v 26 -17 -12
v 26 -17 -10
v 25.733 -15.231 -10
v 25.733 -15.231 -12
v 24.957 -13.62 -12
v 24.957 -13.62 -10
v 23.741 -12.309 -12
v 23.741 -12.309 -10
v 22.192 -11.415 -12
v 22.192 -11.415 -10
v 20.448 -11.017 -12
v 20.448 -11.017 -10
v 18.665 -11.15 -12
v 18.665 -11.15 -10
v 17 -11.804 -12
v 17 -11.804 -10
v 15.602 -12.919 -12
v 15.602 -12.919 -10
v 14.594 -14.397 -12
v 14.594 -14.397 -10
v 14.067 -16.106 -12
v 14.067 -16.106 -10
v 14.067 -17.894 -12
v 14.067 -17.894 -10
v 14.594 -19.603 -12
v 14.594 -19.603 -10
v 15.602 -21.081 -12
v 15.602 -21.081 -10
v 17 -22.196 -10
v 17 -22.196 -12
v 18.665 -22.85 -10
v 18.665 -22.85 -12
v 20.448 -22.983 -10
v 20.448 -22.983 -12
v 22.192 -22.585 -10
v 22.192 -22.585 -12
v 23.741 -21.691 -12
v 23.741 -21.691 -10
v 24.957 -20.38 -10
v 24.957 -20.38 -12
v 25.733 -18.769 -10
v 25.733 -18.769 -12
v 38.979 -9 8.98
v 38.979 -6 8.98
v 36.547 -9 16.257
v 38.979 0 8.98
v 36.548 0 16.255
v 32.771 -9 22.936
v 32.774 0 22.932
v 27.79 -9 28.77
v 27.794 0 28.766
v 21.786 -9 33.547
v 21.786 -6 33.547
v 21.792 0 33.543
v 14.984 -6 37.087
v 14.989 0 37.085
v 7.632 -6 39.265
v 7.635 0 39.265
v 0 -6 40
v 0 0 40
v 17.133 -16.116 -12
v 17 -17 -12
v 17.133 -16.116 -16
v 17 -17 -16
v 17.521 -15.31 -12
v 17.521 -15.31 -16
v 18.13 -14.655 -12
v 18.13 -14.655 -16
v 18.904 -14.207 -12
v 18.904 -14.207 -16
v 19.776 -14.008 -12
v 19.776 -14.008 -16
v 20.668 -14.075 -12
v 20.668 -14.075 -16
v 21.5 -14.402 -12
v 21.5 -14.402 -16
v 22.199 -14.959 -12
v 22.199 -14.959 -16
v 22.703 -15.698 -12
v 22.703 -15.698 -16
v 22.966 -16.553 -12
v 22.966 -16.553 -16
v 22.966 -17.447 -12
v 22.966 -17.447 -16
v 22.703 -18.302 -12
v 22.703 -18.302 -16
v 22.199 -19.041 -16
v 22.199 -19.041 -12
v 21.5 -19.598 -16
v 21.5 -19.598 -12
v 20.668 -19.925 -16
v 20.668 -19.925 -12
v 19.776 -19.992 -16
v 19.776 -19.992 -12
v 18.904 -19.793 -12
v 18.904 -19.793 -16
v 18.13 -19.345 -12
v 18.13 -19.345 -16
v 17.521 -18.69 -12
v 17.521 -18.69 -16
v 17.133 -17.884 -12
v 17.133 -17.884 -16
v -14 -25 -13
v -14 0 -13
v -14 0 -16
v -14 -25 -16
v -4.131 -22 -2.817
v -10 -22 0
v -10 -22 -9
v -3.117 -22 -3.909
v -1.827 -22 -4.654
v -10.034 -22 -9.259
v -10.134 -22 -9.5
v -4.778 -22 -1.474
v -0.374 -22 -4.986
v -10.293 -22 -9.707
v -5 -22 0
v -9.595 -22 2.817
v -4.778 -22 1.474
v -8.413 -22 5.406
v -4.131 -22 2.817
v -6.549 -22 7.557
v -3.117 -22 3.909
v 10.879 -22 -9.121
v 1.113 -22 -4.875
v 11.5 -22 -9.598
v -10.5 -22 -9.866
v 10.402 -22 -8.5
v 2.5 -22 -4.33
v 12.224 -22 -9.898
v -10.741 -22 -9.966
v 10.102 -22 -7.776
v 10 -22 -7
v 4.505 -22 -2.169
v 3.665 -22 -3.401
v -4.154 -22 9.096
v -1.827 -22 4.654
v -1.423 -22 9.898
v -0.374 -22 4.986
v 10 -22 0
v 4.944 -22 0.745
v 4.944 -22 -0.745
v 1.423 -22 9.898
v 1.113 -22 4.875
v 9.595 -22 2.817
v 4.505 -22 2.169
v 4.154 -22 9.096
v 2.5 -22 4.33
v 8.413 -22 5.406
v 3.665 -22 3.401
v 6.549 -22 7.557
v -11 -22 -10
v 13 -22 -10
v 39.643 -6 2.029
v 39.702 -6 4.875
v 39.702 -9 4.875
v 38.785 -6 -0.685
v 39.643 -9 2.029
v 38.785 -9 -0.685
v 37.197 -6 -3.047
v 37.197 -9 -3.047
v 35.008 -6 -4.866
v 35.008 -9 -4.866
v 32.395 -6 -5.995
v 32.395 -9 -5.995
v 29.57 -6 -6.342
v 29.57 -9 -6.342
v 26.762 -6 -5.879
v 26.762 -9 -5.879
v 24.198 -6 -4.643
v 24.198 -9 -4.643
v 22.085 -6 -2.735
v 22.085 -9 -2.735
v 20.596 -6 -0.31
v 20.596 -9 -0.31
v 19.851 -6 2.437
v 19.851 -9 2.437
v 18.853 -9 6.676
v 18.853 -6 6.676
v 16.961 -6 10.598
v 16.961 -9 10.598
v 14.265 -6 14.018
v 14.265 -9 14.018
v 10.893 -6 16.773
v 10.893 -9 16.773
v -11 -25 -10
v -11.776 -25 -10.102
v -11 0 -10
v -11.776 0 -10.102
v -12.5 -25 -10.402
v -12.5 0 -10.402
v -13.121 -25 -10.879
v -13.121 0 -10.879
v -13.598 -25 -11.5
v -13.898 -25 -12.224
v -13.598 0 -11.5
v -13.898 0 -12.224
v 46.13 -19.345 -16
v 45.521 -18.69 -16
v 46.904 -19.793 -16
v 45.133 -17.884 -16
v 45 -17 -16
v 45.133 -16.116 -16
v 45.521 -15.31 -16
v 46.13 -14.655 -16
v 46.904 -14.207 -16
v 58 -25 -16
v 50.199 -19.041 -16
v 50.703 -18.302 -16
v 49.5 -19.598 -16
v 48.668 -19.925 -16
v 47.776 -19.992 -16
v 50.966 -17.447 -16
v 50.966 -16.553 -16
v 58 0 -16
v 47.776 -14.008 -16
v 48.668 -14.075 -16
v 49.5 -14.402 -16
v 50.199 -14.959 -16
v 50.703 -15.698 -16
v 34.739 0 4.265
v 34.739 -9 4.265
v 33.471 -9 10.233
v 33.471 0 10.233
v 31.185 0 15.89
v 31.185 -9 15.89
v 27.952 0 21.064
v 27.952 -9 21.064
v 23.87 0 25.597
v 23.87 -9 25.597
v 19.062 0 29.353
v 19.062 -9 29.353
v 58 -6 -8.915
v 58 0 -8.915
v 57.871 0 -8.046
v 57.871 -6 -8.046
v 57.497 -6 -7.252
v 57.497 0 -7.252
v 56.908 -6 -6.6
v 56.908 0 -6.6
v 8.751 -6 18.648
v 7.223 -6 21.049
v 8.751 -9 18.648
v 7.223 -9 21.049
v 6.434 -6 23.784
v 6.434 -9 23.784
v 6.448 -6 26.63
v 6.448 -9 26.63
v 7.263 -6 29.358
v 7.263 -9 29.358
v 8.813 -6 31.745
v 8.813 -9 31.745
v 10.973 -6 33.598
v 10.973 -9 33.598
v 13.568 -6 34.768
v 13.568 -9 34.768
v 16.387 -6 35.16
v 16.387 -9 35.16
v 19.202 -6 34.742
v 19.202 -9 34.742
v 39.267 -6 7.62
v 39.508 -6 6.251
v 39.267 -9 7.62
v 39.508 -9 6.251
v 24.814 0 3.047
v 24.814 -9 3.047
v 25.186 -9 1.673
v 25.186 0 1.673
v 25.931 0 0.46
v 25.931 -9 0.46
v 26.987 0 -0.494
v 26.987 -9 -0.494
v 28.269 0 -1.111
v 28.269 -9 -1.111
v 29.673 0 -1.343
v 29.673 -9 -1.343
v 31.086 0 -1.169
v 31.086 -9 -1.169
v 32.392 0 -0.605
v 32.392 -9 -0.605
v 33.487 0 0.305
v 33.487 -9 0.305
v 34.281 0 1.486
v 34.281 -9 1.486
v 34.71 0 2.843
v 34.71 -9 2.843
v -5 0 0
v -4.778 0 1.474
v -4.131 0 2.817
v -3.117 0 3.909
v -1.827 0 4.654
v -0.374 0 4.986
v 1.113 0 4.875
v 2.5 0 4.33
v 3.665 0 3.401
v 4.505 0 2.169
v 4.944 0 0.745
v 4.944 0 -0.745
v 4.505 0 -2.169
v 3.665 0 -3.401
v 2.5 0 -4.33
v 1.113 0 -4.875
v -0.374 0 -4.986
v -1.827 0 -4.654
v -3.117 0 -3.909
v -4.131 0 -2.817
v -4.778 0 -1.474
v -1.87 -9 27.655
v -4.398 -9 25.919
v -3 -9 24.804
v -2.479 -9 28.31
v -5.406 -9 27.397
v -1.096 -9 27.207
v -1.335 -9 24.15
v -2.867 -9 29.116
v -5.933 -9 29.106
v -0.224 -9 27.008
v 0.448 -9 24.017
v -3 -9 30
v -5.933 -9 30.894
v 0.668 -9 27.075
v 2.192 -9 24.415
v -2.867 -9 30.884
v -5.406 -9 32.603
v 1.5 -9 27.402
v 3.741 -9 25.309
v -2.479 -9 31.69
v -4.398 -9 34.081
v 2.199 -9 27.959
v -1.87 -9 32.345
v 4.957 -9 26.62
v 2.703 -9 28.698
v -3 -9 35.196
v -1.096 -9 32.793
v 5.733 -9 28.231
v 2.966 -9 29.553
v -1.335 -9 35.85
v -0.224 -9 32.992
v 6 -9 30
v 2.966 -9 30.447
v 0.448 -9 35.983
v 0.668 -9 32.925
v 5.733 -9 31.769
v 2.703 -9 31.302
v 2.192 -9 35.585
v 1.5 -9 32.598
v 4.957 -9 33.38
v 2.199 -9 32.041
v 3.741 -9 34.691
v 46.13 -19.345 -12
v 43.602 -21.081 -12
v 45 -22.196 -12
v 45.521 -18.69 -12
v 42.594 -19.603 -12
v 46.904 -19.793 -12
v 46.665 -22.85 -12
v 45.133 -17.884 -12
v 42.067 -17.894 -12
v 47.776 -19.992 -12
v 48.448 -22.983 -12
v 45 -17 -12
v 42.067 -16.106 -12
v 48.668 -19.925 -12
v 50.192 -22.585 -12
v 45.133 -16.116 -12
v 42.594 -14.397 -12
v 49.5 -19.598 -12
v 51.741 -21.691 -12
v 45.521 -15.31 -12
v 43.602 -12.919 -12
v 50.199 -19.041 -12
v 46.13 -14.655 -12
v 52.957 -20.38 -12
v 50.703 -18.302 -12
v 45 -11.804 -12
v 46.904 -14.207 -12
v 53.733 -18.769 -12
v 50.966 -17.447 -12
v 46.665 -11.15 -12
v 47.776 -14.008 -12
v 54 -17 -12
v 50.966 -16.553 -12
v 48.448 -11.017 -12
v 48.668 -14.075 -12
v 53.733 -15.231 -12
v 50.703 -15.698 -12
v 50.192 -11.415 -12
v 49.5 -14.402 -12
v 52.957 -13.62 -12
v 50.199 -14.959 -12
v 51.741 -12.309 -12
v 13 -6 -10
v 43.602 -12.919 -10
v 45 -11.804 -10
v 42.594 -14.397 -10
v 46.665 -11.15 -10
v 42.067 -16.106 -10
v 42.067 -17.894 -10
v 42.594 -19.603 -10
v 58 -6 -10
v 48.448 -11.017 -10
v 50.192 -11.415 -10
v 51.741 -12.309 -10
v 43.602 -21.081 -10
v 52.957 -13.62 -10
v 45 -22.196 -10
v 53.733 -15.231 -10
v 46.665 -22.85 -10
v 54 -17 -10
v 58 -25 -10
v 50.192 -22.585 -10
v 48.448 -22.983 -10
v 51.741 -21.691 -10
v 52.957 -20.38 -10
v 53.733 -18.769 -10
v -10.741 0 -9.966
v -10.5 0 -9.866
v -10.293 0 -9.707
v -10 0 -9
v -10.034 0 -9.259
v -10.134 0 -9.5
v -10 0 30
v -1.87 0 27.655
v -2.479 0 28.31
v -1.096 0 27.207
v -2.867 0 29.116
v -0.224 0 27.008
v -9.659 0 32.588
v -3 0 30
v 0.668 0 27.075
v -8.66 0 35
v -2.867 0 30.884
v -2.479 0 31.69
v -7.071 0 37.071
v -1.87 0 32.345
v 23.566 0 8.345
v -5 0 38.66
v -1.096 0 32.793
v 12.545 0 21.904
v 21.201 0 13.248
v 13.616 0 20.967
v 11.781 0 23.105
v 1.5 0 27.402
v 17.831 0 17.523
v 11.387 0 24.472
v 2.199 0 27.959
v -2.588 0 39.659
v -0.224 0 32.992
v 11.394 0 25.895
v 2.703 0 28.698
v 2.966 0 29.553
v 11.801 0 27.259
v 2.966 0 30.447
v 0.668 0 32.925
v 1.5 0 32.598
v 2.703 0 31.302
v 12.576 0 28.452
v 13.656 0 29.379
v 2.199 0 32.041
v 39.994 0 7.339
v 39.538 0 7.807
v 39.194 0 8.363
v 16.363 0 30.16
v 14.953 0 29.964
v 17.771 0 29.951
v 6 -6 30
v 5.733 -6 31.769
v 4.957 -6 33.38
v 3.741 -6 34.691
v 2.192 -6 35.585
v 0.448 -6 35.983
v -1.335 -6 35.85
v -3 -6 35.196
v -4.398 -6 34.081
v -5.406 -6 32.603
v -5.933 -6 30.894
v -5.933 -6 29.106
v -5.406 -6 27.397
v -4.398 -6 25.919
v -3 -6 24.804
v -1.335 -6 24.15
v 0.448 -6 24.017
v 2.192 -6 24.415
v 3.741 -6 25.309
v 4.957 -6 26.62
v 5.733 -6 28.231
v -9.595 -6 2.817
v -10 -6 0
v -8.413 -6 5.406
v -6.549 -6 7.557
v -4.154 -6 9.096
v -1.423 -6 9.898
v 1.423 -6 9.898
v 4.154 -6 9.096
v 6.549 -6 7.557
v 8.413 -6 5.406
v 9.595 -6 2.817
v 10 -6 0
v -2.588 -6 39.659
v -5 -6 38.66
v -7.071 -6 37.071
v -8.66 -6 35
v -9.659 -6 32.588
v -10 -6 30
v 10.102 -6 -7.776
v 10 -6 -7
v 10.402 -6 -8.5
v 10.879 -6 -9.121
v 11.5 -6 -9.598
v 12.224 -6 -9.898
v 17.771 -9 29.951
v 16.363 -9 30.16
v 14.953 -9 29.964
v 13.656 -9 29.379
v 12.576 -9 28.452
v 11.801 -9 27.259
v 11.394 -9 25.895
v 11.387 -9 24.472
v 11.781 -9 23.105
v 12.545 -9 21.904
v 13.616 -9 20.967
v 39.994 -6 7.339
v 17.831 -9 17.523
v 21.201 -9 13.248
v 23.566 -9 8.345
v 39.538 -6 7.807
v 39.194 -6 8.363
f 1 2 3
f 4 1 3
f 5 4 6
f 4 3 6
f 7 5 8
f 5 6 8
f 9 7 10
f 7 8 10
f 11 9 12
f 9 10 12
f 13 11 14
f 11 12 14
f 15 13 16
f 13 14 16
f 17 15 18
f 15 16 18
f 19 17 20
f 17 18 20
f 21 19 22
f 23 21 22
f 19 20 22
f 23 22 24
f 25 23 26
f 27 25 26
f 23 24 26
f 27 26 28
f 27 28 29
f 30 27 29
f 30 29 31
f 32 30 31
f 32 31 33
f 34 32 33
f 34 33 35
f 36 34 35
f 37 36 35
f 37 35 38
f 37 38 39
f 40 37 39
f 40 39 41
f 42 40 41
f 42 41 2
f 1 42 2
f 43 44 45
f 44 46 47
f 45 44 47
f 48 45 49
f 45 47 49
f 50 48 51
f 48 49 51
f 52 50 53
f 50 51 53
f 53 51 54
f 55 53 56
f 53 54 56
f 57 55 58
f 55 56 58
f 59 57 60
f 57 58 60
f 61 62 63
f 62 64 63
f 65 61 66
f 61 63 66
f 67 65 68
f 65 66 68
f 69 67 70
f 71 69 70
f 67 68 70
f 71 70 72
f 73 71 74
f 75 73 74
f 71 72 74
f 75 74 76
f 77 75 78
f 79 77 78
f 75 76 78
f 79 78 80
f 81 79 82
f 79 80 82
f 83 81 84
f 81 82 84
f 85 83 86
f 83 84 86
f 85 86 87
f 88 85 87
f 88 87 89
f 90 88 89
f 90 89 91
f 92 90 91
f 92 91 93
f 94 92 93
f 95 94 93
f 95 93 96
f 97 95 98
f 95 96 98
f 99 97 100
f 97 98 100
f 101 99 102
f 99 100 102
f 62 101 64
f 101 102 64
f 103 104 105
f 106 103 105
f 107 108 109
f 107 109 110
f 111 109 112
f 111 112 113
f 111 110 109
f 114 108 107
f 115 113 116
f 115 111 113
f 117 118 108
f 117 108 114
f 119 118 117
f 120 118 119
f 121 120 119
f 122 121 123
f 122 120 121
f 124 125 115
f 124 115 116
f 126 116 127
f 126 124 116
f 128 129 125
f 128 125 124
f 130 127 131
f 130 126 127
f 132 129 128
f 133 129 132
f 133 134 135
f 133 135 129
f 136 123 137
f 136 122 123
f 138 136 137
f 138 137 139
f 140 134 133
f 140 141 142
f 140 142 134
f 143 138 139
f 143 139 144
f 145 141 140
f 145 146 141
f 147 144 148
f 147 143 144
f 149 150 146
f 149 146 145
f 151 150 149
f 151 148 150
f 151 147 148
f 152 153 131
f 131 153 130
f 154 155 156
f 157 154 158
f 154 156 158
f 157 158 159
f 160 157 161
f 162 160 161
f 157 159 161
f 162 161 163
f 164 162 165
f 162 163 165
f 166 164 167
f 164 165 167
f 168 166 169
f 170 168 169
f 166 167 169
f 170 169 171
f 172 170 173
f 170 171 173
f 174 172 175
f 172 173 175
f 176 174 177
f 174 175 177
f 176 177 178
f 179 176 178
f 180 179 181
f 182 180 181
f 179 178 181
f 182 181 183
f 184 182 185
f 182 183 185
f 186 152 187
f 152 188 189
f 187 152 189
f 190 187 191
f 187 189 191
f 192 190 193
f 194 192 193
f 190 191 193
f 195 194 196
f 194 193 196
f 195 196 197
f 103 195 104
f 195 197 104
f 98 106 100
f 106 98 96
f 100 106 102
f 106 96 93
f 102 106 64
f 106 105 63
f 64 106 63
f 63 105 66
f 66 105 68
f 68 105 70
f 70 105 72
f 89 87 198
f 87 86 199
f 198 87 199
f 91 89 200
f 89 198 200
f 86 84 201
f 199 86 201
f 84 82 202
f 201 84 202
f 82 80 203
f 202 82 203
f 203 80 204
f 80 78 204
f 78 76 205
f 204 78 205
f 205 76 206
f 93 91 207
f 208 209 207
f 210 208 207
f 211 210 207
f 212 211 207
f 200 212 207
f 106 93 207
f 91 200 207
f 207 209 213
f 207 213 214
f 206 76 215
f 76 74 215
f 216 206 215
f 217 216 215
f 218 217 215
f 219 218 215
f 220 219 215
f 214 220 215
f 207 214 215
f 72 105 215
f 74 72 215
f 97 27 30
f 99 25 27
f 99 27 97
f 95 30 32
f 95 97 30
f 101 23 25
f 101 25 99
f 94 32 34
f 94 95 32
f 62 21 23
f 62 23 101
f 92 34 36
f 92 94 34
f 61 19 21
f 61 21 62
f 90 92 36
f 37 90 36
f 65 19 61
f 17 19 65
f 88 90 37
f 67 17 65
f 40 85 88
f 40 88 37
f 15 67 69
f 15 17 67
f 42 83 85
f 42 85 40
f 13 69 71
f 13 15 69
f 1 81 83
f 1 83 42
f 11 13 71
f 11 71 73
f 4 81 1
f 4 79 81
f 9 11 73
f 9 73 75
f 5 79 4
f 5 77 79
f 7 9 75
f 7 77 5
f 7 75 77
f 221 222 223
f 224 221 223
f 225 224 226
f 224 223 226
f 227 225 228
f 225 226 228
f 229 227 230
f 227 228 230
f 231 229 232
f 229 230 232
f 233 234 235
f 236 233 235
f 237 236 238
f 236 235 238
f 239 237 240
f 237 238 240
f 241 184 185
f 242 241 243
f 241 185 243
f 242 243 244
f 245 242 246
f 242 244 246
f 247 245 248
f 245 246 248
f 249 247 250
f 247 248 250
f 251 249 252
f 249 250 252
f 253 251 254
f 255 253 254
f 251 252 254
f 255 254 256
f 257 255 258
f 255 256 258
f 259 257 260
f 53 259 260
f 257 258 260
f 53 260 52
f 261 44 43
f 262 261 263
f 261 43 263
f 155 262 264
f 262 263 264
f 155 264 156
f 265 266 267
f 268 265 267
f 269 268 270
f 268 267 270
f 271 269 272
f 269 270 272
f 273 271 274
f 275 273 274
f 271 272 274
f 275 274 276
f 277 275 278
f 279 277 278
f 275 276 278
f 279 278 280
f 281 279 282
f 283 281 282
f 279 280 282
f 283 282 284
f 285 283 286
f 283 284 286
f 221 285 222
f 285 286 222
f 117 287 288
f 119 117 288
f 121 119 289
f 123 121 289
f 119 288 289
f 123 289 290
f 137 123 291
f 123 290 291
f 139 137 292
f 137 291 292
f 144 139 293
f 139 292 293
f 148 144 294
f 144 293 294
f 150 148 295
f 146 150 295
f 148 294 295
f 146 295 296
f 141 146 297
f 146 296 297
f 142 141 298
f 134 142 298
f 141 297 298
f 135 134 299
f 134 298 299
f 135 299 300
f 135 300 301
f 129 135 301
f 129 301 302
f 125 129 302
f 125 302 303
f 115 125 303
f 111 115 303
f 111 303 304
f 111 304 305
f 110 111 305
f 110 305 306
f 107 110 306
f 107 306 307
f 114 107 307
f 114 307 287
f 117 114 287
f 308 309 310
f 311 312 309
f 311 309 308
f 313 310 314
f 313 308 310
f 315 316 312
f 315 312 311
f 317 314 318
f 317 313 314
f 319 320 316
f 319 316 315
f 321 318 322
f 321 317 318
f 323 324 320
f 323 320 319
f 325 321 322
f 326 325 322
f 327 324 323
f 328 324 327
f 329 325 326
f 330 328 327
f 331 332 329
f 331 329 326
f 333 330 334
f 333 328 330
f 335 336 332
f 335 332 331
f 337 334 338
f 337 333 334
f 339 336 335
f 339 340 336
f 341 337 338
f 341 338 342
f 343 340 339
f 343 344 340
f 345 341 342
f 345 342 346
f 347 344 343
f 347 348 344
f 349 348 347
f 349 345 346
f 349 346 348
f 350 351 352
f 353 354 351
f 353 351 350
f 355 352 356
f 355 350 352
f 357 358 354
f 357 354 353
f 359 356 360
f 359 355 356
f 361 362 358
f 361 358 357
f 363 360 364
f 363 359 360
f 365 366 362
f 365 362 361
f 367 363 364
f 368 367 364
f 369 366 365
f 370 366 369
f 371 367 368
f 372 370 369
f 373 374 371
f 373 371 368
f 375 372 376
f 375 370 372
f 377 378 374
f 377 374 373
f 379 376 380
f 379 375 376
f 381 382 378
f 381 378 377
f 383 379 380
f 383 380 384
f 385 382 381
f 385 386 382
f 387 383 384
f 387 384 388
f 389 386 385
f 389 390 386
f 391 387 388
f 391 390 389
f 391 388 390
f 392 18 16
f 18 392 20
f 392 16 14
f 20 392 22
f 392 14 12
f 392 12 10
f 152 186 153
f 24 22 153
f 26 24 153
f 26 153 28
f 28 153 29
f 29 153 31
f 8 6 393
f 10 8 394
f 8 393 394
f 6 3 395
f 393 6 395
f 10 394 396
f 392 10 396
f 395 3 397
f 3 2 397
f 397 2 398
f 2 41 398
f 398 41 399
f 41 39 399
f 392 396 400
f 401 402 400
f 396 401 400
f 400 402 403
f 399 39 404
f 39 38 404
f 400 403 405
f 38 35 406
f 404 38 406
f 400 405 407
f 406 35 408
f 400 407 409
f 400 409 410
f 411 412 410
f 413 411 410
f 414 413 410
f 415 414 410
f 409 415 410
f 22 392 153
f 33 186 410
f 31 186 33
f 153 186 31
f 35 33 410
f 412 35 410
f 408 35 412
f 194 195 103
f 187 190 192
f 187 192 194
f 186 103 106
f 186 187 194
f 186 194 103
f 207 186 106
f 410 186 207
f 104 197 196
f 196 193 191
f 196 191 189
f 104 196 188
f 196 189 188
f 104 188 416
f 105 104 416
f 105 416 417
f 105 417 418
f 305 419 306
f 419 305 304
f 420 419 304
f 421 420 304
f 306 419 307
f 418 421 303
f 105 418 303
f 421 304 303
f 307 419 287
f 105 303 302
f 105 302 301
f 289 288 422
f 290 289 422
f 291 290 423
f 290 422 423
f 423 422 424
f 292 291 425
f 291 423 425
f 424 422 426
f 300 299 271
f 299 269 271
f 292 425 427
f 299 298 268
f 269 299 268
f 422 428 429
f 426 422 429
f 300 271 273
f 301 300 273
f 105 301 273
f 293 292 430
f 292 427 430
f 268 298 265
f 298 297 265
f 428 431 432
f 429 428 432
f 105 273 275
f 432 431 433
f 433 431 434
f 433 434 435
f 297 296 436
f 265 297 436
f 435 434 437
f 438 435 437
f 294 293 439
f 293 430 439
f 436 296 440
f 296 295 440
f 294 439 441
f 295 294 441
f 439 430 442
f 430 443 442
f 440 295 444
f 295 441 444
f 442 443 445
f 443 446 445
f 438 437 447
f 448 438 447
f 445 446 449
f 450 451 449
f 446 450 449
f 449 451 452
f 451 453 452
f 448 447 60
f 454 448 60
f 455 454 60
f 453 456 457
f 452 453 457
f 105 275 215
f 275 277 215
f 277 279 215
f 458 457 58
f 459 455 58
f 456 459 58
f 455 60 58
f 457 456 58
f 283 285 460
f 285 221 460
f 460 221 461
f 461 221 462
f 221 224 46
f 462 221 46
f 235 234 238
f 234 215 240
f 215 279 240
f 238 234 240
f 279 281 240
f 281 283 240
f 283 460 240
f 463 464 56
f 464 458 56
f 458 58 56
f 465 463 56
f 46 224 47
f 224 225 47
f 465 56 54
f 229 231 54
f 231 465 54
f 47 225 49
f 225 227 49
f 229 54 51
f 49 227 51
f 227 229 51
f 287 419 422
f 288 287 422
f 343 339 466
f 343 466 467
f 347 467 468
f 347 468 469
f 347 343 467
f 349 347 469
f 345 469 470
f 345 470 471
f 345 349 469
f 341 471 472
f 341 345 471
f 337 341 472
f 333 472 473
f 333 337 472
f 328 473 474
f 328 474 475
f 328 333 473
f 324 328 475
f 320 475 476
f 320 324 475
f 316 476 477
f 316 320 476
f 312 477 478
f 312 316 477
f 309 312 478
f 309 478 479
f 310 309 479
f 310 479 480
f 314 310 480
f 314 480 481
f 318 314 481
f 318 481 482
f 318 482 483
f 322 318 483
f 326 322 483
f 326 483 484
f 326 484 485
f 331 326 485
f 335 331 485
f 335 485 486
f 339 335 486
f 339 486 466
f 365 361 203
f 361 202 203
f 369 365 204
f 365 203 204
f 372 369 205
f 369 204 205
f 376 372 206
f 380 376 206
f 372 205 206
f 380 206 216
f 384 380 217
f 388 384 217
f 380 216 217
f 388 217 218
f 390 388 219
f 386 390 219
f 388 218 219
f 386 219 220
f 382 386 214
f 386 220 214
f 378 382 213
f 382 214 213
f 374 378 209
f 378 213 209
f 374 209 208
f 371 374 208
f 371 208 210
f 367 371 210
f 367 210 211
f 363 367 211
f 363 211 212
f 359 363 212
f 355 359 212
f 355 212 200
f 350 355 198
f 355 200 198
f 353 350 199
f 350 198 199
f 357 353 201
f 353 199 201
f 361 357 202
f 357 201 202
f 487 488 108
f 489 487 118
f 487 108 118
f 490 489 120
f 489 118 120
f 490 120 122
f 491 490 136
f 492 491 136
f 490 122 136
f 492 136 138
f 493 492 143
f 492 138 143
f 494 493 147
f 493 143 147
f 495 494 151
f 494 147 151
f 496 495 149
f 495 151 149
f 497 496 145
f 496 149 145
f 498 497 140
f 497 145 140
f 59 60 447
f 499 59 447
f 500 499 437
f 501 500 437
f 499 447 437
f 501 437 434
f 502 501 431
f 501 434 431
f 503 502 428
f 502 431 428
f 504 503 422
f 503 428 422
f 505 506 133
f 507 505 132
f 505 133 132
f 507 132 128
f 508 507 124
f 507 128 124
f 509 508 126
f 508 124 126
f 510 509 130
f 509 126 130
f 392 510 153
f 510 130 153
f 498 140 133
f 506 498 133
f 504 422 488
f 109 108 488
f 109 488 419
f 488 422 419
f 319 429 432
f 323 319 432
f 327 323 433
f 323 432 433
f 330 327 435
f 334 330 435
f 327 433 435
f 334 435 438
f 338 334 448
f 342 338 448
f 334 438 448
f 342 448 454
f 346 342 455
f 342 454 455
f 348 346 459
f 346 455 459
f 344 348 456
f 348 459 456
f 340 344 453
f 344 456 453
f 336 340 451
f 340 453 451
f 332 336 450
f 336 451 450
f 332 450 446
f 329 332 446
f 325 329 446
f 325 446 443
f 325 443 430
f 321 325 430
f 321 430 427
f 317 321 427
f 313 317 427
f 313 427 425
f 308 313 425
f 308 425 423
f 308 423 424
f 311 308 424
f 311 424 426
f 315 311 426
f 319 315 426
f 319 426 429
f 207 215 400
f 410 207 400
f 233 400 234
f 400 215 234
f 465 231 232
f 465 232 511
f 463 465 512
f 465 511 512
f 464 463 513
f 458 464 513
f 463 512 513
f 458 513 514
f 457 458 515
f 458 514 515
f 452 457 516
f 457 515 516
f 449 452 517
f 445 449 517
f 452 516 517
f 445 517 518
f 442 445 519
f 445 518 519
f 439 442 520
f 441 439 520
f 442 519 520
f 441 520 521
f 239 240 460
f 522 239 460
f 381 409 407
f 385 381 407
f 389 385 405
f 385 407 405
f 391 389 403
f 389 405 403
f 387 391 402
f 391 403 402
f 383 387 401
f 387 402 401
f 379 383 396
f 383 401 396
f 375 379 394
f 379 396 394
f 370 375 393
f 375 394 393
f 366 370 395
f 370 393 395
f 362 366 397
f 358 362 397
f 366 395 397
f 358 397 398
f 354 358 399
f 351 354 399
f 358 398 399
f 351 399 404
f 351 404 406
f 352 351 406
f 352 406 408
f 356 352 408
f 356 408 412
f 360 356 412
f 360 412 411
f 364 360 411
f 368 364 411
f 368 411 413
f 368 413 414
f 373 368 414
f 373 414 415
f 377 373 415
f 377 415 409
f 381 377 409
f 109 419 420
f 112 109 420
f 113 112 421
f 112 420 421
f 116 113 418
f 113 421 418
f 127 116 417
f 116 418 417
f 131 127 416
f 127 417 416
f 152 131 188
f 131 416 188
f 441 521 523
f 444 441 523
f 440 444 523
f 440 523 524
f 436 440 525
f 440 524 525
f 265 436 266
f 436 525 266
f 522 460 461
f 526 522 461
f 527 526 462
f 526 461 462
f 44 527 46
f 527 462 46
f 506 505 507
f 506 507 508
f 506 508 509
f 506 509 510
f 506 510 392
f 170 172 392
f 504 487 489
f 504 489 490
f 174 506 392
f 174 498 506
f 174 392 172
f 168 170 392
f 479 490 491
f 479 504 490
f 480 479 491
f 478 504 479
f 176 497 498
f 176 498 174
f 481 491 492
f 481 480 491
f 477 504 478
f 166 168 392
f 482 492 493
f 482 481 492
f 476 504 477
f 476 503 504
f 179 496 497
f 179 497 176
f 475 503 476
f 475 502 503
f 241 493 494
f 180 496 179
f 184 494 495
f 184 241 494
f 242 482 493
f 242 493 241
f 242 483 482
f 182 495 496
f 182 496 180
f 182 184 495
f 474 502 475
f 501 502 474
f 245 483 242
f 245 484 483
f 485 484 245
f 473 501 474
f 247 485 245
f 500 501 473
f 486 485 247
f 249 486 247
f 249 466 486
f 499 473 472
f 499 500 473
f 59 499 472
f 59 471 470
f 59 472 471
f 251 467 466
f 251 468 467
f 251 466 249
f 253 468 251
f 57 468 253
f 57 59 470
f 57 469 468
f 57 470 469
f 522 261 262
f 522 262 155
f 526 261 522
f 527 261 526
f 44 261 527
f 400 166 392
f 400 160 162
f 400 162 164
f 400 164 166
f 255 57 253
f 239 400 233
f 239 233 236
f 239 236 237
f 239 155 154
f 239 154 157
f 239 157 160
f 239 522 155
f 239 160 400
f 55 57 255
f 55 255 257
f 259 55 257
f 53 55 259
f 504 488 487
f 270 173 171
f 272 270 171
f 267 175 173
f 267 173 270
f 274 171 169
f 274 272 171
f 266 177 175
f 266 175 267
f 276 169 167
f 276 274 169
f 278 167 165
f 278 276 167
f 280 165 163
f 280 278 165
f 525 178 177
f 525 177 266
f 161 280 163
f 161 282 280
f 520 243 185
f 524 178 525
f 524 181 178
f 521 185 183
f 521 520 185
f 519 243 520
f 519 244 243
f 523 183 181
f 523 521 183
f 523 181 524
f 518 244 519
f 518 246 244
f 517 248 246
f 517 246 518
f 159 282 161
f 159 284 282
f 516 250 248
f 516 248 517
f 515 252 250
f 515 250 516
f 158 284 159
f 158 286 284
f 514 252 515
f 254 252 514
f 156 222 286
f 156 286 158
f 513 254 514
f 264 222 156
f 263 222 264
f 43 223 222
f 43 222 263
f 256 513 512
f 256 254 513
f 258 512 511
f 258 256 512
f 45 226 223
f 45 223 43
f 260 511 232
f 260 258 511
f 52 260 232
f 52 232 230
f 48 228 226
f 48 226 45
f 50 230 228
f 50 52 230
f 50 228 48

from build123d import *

# Parameters (mm, degrees)
F1_DEPTH        = 25
F2_R            = 6
F3_DEPTH        = 19
F4_R            = 6
F5_DEPTH        = 16
F7_DEPTH        = 3
F9_D            = 10
F11_D           = 6
F13_DEPTH       = 9
F15_D           = 6
F15_CBORE_D     = 12
F15_CBORE_DEPTH = 2


with BuildPart() as f1:
    # F0 (on Front) → F1 (new body)
    with BuildSketch(Plane.XZ):
        with BuildLine():
            Line((-14, -16), (0, -16))
            Line((0, -16), (58, -16))
            Line((58, -16), (58, -8.9151388271))
            ThreePointArc((58, -8.9151388271), (57.7132792525, -7.6352498874), (56.9079228681, -6.6000080901))
            Line((56.9079228681, -6.6000080901), (39.9944124577, 7.3385884551))
            ThreePointArc((39.9944124577, 7.3385884551), (39.3510237496, 8.0754894114), (38.9789165822, 8.9802038996))
            ThreePointArc((38.9789165822, 8.9802038996), (24.9077482324, 31.2986274139), (0, 40))
            ThreePointArc((0, 40), (-7.0710678119, 37.0710678119), (-10, 30))
            Line((-10, 30), (-10, -9))
            ThreePointArc((-10, -9), (-10.2928932188, -9.7071067812), (-11, -10))
            ThreePointArc((-11, -10), (-13.1213203436, -10.8786796564), (-14, -13))
            Line((-14, -13), (-14, -16))
        make_face()
    extrude(amount=F1_DEPTH)

    # F2 (on face) → F3 (cut)
    with BuildSketch(Plane.XZ.offset(25)):
        with BuildLine():
            ThreePointArc((-10, 0), (0, 10), (10, 0))
            Line((10, 0), (10, -7))
            ThreePointArc((10, -7), (10.8786796564, -9.1213203436), (13, -10))
            Line((13, -10), (58, -10))
            Line((58, -10), (58, -8.9151388271))
            ThreePointArc((58, -8.9151388271), (57.7132792525, -7.6352498874), (56.9079228681, -6.6000080901))
            Line((56.9079228681, -6.6000080901), (39.9944124577, 7.3385884551))
            ThreePointArc((39.9944124577, 7.3385884551), (39.3510237496, 8.0754894114), (38.9789165822, 8.9802038996))
            ThreePointArc((38.9789165822, 8.9802038996), (39.3938985367, 6.9369127198), (39.7018460657, 4.8747737362))
            ThreePointArc((39.7018460657, 4.8747737362), (30.9950779833, -6.2693812143), (19.8509230328, 2.4373868681))
            ThreePointArc((19.8509230328, 2.4373868681), (16.9609619231, 10.5983852847), (10.8927807003, 16.7734113589))
            ThreePointArc((10.8927807003, 16.7734113589), (7.952465371, 30.6065073885), (21.7855614006, 33.5468227178))
            ThreePointArc((21.7855614006, 33.5468227178), (11.3606137882, 38.3527893947), (0, 40))
            ThreePointArc((0, 40), (-7.0710678119, 37.0710678119), (-10, 30))
            Line((-10, 30), (-10, 0))
        make_face()
        with Locations((0, 30)):
            Circle(F2_R, mode=Mode.SUBTRACT)
    extrude(amount=-F3_DEPTH, mode=Mode.SUBTRACT)

    # F4 (on face) → F5 (cut)
    with BuildSketch(Plane.XZ.offset(25)):
        with Locations((0, 30)):
            Circle(F4_R)
        with BuildLine():
            ThreePointArc((39.7018460657, 4.8747737362), (33.9219238463, 21.1967705693), (21.7855614006, 33.5468227178))
            ThreePointArc((21.7855614006, 33.5468227178), (7.952465371, 30.6065073885), (10.8927807003, 16.7734113589))
            ThreePointArc((10.8927807003, 16.7734113589), (16.9609619231, 10.5983852847), (19.8509230328, 2.4373868681))
            ThreePointArc((19.8509230328, 2.4373868681), (30.9950779833, -6.2693812143), (39.7018460657, 4.8747737362))
        make_face()
    extrude(amount=-F5_DEPTH, mode=Mode.SUBTRACT)

    # F6 (on face) → F7 (cut)
    with BuildSketch(Plane.XZ.offset(25)):
        with BuildLine():
            Line((-11, -10), (13, -10))
            ThreePointArc((13, -10), (10.8786796564, -9.1213203436), (10, -7))
            Line((10, -7), (10, 0))
            ThreePointArc((10, 0), (0, 10), (-10, 0))
            Line((-10, 0), (-10, -9))
            ThreePointArc((-10, -9), (-10.2928932188, -9.7071067812), (-11, -10))
        make_face()
    extrude(amount=-F7_DEPTH, mode=Mode.SUBTRACT)

    # F9 (through all)
    with Locations(Plane.XZ.offset(22)):
        with Locations((0, 0)):
            Hole(F9_D / 2)

    # F11 (through all)
    with Locations(Plane.XZ.offset(9)):
        with Locations((0, 30)):
            Hole(F11_D / 2)

    # F12 (on face) → F13 (cut)
    with BuildSketch(Plane.XZ.offset(9)):
        with BuildLine():
            ThreePointArc((34.7391153074, 4.2654270192), (29.6816833655, 18.5471742482), (19.0623662255, 29.3534698781))
            ThreePointArc((19.0623662255, 29.3534698781), (12.1458182107, 27.8833122134), (13.6159758754, 20.9667641986))
            ThreePointArc((13.6159758754, 20.9667641986), (21.2012024039, 13.2479816058), (24.813653791, 3.0467335851))
            ThreePointArc((24.813653791, 3.0467335851), (30.3857312663, -1.3066504561), (34.7391153074, 4.2654270192))
        make_face()
    extrude(amount=-F13_DEPTH, mode=Mode.SUBTRACT)

    # F15 (through all)
    with Locations(Plane.XY.offset(-10)):
        with Locations((20, -17), (48, -17)):
            CounterBoreHole(F15_D / 2, F15_CBORE_D / 2, F15_CBORE_DEPTH)


solid = f1.part
